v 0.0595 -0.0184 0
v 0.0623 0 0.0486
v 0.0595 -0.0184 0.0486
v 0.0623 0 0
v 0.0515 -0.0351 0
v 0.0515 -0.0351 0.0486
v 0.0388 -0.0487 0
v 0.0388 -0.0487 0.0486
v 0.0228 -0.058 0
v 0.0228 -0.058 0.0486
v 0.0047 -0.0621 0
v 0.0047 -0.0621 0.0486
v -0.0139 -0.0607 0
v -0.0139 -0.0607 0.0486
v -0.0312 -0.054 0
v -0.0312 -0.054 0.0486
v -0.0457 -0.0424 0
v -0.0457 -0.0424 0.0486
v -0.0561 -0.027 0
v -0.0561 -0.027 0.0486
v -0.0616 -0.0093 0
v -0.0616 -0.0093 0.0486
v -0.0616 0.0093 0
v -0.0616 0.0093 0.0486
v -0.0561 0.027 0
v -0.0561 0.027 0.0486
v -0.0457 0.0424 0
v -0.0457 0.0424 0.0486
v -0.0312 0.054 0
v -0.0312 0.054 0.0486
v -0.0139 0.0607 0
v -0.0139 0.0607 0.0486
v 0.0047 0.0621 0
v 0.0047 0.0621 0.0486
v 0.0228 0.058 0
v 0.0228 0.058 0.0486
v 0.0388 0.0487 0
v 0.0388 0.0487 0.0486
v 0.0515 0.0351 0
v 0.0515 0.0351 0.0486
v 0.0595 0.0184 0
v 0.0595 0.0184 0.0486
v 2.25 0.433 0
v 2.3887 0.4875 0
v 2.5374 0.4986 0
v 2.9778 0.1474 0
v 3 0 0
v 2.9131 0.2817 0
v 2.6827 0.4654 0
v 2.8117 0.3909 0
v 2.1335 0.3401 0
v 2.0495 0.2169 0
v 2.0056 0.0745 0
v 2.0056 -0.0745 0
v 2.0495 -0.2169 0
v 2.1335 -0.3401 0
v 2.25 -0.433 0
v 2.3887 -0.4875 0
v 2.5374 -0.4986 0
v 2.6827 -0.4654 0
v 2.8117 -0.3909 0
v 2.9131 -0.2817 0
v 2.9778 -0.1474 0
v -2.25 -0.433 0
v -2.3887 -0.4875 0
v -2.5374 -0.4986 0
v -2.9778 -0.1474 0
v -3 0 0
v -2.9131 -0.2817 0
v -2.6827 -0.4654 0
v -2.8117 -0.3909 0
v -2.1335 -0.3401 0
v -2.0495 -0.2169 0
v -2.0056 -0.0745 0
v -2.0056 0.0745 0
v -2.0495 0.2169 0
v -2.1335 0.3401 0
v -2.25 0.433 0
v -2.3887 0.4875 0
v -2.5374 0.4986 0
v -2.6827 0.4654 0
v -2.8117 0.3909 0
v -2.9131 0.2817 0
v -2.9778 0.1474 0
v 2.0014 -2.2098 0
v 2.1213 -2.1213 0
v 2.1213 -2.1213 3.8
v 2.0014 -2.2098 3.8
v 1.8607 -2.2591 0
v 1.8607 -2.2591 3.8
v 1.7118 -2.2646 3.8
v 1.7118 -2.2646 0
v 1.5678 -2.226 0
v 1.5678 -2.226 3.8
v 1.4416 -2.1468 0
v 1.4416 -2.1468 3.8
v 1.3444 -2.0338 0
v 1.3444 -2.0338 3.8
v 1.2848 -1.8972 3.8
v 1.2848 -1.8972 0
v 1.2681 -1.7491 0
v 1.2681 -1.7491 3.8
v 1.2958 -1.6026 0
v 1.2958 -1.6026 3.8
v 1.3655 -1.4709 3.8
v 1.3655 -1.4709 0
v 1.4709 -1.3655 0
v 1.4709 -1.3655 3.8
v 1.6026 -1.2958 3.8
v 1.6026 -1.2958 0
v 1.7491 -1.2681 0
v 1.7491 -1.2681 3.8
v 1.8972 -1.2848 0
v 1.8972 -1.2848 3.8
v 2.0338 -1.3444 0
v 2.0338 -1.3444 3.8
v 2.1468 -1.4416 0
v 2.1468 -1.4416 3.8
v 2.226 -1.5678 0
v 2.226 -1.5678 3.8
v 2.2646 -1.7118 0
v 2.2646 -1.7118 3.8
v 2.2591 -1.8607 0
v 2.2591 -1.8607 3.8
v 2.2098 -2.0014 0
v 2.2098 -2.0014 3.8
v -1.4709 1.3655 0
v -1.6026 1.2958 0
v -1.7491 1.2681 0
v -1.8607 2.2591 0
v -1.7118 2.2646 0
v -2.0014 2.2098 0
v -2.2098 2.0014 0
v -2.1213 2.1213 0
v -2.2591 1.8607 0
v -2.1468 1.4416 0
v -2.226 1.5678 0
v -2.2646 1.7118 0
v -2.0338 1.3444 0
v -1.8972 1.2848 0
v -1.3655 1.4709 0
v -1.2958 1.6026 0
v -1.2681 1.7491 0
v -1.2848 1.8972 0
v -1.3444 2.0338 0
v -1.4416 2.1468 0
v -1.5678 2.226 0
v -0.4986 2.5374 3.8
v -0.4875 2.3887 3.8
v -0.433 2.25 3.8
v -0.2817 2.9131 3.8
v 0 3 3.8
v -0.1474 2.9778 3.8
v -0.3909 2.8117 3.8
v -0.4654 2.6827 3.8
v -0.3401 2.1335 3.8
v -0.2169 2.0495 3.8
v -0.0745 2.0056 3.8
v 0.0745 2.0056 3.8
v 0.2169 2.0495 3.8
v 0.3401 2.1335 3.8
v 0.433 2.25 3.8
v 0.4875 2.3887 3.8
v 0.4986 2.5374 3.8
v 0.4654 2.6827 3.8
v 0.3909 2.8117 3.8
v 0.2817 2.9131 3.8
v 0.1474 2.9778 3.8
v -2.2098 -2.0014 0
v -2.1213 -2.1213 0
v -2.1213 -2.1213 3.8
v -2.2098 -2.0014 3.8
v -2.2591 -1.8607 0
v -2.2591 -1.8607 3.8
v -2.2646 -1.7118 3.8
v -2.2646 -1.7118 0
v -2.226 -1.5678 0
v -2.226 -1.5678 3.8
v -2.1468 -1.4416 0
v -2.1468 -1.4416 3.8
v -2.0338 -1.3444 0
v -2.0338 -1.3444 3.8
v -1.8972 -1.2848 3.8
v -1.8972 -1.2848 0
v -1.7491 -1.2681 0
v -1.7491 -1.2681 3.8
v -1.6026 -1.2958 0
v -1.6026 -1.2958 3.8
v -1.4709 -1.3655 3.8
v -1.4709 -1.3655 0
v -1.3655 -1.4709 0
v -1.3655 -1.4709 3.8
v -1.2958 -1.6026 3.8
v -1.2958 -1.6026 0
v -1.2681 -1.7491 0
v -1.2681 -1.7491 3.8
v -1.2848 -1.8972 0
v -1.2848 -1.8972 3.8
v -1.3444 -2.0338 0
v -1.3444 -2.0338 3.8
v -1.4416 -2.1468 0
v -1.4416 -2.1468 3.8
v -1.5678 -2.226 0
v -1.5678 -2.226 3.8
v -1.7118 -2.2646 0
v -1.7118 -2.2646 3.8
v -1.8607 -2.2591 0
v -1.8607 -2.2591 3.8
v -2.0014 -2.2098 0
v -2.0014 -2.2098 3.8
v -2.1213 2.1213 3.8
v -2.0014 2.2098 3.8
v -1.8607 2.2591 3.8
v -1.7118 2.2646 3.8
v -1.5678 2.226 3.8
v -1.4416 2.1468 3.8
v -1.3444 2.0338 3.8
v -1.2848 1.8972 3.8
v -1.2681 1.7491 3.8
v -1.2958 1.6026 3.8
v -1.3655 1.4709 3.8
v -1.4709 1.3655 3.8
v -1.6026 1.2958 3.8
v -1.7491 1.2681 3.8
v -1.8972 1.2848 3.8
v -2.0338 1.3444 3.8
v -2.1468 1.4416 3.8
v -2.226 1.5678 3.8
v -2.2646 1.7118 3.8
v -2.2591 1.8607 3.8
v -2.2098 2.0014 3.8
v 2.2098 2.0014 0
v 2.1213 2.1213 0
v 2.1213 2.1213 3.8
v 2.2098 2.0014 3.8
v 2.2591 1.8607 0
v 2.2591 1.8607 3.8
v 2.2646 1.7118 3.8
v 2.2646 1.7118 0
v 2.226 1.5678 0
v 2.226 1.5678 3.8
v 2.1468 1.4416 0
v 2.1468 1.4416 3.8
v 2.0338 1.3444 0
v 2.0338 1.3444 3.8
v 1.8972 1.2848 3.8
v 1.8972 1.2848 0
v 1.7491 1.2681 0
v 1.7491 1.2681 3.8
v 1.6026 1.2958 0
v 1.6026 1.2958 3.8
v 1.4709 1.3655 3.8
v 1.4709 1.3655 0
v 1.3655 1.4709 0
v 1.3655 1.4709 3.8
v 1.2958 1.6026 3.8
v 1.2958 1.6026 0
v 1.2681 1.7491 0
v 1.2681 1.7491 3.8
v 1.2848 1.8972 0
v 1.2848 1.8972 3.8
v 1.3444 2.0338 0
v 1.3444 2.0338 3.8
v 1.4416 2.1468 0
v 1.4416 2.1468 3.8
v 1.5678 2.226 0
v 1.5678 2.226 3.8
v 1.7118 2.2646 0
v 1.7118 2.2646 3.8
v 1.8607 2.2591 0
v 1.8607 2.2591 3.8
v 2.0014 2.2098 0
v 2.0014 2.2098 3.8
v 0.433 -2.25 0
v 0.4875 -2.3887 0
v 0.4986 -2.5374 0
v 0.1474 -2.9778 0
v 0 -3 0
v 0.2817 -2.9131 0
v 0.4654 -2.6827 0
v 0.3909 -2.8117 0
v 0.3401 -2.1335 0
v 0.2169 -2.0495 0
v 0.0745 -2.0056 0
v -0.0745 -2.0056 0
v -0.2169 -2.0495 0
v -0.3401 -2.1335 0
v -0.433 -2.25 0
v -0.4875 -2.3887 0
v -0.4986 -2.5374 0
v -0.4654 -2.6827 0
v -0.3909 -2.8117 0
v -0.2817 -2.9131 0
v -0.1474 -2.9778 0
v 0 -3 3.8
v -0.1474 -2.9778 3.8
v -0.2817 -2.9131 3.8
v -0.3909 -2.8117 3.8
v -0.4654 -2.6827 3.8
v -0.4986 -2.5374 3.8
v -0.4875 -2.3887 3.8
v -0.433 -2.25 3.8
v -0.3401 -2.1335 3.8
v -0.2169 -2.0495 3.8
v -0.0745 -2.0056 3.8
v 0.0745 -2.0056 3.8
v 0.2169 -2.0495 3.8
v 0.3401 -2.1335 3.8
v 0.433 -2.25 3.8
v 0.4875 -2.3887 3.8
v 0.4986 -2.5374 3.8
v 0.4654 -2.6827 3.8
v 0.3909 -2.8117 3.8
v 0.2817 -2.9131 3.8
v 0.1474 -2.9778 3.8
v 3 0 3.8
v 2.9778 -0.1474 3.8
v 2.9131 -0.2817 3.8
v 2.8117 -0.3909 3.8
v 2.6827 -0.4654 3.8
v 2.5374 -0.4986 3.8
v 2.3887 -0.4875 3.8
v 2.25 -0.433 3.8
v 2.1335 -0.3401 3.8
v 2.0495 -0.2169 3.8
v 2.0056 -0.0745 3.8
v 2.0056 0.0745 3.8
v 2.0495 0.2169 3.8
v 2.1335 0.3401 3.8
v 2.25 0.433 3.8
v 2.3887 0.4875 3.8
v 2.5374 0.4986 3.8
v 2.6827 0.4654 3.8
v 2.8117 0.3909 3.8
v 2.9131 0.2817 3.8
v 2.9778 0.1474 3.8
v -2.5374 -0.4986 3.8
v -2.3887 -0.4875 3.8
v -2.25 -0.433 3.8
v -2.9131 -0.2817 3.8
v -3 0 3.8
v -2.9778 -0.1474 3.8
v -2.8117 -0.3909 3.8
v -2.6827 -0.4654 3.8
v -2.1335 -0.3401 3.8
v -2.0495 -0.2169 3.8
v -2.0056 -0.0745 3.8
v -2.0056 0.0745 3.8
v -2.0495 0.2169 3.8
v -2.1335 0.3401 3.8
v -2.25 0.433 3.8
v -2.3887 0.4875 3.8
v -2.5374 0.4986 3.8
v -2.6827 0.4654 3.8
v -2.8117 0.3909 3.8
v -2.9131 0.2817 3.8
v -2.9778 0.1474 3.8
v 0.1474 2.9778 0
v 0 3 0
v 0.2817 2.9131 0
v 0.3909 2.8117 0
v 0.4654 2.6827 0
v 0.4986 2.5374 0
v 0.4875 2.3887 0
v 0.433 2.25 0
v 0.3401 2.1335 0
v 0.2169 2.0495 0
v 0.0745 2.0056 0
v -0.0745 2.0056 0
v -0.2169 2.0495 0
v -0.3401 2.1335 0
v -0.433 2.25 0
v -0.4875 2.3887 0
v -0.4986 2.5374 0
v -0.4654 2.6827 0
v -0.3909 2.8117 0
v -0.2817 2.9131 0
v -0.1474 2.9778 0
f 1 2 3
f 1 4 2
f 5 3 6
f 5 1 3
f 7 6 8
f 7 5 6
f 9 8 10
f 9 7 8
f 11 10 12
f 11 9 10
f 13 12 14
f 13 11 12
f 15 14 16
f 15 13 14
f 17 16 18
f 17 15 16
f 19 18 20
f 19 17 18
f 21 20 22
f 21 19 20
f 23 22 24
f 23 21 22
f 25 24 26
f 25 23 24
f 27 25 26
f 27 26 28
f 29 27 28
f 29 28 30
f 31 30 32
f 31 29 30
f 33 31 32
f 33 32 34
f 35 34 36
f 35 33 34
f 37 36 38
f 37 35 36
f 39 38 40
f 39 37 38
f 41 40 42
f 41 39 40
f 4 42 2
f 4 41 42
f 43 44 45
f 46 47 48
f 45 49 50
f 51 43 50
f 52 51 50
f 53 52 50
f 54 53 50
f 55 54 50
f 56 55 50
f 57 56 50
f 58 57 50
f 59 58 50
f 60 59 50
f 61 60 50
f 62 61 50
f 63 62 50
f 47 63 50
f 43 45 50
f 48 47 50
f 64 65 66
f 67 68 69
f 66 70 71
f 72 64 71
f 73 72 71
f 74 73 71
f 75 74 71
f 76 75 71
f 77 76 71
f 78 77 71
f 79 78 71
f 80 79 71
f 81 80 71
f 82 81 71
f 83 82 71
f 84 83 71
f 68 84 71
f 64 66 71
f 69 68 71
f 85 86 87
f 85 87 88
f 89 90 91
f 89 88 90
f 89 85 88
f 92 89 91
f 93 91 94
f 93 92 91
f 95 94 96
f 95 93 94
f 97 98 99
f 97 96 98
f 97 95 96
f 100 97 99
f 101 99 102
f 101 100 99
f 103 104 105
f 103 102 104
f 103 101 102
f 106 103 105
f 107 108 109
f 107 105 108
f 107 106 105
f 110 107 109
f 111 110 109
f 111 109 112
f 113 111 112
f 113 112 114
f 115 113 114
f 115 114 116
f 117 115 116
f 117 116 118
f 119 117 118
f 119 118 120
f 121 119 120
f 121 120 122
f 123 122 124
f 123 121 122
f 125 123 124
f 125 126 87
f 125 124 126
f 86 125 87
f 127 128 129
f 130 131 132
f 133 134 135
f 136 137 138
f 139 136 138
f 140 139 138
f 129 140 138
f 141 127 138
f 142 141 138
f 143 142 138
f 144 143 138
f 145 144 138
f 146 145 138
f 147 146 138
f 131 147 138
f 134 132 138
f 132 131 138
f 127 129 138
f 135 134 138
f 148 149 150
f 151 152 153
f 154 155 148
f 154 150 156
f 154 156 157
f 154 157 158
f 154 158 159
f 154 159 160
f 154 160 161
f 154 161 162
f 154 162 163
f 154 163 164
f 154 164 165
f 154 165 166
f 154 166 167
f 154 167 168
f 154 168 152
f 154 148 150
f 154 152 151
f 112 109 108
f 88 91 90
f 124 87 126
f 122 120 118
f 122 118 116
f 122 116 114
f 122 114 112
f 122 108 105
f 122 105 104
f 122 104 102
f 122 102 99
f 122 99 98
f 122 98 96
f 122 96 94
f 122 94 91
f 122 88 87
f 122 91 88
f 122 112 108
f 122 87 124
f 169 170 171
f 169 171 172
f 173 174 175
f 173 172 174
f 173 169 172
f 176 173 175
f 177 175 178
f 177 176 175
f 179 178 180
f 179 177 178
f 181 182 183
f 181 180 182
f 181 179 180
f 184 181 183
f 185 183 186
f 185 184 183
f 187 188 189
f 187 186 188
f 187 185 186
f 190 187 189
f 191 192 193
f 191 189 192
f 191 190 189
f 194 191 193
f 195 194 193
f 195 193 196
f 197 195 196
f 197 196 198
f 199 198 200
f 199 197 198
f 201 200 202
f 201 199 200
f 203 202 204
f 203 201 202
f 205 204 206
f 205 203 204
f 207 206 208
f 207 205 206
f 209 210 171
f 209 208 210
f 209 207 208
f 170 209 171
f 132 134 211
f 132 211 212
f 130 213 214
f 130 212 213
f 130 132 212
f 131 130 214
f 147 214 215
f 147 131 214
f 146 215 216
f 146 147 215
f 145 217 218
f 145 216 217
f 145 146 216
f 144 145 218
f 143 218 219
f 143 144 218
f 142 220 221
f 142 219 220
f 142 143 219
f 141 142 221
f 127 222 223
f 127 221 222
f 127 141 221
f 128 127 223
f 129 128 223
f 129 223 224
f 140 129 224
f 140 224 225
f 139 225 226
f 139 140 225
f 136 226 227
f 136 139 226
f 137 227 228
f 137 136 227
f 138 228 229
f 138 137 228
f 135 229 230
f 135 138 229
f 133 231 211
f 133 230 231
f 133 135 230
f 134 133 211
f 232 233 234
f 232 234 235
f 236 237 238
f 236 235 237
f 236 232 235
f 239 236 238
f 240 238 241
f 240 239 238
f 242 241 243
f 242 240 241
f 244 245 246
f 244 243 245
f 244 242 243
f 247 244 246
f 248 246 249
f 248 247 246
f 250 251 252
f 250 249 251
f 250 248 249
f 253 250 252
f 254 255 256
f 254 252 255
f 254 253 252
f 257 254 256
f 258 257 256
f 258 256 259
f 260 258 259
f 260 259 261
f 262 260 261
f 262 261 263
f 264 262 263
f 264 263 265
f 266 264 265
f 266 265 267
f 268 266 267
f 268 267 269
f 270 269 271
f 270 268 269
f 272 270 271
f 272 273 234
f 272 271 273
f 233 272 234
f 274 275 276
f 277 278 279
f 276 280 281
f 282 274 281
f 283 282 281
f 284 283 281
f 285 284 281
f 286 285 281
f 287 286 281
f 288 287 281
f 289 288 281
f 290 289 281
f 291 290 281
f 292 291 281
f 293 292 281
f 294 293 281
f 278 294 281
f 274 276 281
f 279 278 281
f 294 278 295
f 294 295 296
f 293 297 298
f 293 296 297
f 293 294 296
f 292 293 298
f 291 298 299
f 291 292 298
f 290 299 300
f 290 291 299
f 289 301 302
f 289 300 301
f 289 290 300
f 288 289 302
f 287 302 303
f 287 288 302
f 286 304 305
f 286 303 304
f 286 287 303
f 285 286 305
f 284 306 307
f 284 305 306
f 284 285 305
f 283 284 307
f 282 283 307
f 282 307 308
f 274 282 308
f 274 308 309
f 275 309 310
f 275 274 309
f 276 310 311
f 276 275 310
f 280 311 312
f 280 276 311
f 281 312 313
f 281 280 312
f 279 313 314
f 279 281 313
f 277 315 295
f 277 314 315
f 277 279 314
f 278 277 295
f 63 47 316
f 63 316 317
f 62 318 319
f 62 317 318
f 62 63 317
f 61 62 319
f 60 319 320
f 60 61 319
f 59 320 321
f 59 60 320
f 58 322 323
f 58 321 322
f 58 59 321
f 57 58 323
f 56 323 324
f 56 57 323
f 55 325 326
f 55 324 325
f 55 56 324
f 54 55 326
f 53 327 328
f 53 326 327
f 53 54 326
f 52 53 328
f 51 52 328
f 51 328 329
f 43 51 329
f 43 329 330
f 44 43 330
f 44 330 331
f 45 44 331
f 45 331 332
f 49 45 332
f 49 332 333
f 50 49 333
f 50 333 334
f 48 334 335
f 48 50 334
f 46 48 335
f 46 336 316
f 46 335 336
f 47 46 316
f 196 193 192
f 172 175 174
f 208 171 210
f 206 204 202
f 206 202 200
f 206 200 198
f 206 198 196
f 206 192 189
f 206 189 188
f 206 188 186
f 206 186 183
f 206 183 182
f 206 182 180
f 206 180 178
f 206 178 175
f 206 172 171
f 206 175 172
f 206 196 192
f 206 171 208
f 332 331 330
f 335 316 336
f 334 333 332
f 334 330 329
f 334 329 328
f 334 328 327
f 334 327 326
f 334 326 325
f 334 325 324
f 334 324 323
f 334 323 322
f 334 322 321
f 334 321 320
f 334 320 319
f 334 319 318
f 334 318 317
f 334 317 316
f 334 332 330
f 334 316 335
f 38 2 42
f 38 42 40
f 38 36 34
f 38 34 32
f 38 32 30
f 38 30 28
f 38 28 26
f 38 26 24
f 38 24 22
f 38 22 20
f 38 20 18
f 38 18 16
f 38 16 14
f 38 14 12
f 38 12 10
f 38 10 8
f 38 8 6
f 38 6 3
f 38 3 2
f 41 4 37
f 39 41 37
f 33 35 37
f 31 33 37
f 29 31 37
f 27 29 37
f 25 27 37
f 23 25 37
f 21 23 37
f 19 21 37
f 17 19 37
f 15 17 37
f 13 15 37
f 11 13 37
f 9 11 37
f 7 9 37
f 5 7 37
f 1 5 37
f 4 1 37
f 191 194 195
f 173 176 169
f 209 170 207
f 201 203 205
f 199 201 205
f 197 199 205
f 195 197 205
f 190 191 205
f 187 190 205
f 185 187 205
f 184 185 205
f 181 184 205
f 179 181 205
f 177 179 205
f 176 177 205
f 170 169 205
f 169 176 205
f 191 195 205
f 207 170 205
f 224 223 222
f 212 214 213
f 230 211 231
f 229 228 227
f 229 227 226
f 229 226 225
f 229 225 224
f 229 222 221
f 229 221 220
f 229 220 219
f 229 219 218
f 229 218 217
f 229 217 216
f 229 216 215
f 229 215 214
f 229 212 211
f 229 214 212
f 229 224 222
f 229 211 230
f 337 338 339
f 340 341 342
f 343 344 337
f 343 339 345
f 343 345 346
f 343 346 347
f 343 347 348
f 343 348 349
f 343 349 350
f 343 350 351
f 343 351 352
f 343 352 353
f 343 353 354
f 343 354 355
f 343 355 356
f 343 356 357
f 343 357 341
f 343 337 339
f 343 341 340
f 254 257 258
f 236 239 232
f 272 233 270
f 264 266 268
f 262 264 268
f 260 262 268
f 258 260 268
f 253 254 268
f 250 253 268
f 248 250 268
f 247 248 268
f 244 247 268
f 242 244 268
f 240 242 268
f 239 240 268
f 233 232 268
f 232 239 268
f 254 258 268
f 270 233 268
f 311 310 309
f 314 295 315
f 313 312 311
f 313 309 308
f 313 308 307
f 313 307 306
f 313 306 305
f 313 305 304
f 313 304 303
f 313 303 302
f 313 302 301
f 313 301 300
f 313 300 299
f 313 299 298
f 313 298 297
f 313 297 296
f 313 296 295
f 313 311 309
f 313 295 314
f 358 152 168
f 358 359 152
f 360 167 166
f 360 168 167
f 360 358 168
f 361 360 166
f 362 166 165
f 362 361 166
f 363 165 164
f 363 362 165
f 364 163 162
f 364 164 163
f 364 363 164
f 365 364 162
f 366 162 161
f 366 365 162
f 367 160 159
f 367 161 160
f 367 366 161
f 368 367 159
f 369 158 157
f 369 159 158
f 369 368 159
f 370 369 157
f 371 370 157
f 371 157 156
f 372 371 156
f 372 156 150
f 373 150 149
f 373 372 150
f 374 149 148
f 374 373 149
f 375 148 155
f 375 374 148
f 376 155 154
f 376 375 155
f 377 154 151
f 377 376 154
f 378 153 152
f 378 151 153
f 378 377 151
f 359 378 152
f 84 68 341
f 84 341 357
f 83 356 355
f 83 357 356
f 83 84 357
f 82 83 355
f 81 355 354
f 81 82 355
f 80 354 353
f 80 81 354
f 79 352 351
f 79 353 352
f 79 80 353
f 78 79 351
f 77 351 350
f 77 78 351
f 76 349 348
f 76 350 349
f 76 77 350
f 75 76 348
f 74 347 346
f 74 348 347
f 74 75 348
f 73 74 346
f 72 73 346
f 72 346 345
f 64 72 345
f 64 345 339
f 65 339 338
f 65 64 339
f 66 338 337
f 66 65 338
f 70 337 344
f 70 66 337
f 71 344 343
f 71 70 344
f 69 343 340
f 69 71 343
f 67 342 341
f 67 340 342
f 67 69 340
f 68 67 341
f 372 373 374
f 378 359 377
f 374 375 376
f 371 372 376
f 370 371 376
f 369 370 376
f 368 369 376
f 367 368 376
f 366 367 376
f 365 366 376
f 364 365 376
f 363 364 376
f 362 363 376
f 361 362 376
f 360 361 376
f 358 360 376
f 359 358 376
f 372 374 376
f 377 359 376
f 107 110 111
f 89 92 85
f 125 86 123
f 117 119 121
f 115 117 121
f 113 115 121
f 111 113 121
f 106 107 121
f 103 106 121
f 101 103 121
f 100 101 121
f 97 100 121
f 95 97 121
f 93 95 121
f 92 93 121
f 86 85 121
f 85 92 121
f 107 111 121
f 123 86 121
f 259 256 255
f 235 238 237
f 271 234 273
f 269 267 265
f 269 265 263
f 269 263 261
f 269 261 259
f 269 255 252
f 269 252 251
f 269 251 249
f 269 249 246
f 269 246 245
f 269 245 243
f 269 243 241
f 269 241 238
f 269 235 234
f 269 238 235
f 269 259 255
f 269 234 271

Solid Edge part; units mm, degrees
sketch "Sketch1" plane through (0, 0, 0) normal (0, 0, 1) x (1, 0, 0)
  circle A0 centre (2.5, 0) radius 0.5
extrude "Protrusion1" add sketch "Sketch1" along normal blind 3.8
pattern_circular "Pattern1" count 8 over 360 about axis through (0, 0, 0) along (0, 0, -1) of "Protrusion1"
sketch "Sketch2" plane through (0, 0, 0) normal (0, 0, 1) x (1, 0, 0)
  circle A0 centre (0, 0) radius 0.0623
extrude "ExtrudedProtrusion_3" add sketch "Sketch2" along normal blind 0.0486
